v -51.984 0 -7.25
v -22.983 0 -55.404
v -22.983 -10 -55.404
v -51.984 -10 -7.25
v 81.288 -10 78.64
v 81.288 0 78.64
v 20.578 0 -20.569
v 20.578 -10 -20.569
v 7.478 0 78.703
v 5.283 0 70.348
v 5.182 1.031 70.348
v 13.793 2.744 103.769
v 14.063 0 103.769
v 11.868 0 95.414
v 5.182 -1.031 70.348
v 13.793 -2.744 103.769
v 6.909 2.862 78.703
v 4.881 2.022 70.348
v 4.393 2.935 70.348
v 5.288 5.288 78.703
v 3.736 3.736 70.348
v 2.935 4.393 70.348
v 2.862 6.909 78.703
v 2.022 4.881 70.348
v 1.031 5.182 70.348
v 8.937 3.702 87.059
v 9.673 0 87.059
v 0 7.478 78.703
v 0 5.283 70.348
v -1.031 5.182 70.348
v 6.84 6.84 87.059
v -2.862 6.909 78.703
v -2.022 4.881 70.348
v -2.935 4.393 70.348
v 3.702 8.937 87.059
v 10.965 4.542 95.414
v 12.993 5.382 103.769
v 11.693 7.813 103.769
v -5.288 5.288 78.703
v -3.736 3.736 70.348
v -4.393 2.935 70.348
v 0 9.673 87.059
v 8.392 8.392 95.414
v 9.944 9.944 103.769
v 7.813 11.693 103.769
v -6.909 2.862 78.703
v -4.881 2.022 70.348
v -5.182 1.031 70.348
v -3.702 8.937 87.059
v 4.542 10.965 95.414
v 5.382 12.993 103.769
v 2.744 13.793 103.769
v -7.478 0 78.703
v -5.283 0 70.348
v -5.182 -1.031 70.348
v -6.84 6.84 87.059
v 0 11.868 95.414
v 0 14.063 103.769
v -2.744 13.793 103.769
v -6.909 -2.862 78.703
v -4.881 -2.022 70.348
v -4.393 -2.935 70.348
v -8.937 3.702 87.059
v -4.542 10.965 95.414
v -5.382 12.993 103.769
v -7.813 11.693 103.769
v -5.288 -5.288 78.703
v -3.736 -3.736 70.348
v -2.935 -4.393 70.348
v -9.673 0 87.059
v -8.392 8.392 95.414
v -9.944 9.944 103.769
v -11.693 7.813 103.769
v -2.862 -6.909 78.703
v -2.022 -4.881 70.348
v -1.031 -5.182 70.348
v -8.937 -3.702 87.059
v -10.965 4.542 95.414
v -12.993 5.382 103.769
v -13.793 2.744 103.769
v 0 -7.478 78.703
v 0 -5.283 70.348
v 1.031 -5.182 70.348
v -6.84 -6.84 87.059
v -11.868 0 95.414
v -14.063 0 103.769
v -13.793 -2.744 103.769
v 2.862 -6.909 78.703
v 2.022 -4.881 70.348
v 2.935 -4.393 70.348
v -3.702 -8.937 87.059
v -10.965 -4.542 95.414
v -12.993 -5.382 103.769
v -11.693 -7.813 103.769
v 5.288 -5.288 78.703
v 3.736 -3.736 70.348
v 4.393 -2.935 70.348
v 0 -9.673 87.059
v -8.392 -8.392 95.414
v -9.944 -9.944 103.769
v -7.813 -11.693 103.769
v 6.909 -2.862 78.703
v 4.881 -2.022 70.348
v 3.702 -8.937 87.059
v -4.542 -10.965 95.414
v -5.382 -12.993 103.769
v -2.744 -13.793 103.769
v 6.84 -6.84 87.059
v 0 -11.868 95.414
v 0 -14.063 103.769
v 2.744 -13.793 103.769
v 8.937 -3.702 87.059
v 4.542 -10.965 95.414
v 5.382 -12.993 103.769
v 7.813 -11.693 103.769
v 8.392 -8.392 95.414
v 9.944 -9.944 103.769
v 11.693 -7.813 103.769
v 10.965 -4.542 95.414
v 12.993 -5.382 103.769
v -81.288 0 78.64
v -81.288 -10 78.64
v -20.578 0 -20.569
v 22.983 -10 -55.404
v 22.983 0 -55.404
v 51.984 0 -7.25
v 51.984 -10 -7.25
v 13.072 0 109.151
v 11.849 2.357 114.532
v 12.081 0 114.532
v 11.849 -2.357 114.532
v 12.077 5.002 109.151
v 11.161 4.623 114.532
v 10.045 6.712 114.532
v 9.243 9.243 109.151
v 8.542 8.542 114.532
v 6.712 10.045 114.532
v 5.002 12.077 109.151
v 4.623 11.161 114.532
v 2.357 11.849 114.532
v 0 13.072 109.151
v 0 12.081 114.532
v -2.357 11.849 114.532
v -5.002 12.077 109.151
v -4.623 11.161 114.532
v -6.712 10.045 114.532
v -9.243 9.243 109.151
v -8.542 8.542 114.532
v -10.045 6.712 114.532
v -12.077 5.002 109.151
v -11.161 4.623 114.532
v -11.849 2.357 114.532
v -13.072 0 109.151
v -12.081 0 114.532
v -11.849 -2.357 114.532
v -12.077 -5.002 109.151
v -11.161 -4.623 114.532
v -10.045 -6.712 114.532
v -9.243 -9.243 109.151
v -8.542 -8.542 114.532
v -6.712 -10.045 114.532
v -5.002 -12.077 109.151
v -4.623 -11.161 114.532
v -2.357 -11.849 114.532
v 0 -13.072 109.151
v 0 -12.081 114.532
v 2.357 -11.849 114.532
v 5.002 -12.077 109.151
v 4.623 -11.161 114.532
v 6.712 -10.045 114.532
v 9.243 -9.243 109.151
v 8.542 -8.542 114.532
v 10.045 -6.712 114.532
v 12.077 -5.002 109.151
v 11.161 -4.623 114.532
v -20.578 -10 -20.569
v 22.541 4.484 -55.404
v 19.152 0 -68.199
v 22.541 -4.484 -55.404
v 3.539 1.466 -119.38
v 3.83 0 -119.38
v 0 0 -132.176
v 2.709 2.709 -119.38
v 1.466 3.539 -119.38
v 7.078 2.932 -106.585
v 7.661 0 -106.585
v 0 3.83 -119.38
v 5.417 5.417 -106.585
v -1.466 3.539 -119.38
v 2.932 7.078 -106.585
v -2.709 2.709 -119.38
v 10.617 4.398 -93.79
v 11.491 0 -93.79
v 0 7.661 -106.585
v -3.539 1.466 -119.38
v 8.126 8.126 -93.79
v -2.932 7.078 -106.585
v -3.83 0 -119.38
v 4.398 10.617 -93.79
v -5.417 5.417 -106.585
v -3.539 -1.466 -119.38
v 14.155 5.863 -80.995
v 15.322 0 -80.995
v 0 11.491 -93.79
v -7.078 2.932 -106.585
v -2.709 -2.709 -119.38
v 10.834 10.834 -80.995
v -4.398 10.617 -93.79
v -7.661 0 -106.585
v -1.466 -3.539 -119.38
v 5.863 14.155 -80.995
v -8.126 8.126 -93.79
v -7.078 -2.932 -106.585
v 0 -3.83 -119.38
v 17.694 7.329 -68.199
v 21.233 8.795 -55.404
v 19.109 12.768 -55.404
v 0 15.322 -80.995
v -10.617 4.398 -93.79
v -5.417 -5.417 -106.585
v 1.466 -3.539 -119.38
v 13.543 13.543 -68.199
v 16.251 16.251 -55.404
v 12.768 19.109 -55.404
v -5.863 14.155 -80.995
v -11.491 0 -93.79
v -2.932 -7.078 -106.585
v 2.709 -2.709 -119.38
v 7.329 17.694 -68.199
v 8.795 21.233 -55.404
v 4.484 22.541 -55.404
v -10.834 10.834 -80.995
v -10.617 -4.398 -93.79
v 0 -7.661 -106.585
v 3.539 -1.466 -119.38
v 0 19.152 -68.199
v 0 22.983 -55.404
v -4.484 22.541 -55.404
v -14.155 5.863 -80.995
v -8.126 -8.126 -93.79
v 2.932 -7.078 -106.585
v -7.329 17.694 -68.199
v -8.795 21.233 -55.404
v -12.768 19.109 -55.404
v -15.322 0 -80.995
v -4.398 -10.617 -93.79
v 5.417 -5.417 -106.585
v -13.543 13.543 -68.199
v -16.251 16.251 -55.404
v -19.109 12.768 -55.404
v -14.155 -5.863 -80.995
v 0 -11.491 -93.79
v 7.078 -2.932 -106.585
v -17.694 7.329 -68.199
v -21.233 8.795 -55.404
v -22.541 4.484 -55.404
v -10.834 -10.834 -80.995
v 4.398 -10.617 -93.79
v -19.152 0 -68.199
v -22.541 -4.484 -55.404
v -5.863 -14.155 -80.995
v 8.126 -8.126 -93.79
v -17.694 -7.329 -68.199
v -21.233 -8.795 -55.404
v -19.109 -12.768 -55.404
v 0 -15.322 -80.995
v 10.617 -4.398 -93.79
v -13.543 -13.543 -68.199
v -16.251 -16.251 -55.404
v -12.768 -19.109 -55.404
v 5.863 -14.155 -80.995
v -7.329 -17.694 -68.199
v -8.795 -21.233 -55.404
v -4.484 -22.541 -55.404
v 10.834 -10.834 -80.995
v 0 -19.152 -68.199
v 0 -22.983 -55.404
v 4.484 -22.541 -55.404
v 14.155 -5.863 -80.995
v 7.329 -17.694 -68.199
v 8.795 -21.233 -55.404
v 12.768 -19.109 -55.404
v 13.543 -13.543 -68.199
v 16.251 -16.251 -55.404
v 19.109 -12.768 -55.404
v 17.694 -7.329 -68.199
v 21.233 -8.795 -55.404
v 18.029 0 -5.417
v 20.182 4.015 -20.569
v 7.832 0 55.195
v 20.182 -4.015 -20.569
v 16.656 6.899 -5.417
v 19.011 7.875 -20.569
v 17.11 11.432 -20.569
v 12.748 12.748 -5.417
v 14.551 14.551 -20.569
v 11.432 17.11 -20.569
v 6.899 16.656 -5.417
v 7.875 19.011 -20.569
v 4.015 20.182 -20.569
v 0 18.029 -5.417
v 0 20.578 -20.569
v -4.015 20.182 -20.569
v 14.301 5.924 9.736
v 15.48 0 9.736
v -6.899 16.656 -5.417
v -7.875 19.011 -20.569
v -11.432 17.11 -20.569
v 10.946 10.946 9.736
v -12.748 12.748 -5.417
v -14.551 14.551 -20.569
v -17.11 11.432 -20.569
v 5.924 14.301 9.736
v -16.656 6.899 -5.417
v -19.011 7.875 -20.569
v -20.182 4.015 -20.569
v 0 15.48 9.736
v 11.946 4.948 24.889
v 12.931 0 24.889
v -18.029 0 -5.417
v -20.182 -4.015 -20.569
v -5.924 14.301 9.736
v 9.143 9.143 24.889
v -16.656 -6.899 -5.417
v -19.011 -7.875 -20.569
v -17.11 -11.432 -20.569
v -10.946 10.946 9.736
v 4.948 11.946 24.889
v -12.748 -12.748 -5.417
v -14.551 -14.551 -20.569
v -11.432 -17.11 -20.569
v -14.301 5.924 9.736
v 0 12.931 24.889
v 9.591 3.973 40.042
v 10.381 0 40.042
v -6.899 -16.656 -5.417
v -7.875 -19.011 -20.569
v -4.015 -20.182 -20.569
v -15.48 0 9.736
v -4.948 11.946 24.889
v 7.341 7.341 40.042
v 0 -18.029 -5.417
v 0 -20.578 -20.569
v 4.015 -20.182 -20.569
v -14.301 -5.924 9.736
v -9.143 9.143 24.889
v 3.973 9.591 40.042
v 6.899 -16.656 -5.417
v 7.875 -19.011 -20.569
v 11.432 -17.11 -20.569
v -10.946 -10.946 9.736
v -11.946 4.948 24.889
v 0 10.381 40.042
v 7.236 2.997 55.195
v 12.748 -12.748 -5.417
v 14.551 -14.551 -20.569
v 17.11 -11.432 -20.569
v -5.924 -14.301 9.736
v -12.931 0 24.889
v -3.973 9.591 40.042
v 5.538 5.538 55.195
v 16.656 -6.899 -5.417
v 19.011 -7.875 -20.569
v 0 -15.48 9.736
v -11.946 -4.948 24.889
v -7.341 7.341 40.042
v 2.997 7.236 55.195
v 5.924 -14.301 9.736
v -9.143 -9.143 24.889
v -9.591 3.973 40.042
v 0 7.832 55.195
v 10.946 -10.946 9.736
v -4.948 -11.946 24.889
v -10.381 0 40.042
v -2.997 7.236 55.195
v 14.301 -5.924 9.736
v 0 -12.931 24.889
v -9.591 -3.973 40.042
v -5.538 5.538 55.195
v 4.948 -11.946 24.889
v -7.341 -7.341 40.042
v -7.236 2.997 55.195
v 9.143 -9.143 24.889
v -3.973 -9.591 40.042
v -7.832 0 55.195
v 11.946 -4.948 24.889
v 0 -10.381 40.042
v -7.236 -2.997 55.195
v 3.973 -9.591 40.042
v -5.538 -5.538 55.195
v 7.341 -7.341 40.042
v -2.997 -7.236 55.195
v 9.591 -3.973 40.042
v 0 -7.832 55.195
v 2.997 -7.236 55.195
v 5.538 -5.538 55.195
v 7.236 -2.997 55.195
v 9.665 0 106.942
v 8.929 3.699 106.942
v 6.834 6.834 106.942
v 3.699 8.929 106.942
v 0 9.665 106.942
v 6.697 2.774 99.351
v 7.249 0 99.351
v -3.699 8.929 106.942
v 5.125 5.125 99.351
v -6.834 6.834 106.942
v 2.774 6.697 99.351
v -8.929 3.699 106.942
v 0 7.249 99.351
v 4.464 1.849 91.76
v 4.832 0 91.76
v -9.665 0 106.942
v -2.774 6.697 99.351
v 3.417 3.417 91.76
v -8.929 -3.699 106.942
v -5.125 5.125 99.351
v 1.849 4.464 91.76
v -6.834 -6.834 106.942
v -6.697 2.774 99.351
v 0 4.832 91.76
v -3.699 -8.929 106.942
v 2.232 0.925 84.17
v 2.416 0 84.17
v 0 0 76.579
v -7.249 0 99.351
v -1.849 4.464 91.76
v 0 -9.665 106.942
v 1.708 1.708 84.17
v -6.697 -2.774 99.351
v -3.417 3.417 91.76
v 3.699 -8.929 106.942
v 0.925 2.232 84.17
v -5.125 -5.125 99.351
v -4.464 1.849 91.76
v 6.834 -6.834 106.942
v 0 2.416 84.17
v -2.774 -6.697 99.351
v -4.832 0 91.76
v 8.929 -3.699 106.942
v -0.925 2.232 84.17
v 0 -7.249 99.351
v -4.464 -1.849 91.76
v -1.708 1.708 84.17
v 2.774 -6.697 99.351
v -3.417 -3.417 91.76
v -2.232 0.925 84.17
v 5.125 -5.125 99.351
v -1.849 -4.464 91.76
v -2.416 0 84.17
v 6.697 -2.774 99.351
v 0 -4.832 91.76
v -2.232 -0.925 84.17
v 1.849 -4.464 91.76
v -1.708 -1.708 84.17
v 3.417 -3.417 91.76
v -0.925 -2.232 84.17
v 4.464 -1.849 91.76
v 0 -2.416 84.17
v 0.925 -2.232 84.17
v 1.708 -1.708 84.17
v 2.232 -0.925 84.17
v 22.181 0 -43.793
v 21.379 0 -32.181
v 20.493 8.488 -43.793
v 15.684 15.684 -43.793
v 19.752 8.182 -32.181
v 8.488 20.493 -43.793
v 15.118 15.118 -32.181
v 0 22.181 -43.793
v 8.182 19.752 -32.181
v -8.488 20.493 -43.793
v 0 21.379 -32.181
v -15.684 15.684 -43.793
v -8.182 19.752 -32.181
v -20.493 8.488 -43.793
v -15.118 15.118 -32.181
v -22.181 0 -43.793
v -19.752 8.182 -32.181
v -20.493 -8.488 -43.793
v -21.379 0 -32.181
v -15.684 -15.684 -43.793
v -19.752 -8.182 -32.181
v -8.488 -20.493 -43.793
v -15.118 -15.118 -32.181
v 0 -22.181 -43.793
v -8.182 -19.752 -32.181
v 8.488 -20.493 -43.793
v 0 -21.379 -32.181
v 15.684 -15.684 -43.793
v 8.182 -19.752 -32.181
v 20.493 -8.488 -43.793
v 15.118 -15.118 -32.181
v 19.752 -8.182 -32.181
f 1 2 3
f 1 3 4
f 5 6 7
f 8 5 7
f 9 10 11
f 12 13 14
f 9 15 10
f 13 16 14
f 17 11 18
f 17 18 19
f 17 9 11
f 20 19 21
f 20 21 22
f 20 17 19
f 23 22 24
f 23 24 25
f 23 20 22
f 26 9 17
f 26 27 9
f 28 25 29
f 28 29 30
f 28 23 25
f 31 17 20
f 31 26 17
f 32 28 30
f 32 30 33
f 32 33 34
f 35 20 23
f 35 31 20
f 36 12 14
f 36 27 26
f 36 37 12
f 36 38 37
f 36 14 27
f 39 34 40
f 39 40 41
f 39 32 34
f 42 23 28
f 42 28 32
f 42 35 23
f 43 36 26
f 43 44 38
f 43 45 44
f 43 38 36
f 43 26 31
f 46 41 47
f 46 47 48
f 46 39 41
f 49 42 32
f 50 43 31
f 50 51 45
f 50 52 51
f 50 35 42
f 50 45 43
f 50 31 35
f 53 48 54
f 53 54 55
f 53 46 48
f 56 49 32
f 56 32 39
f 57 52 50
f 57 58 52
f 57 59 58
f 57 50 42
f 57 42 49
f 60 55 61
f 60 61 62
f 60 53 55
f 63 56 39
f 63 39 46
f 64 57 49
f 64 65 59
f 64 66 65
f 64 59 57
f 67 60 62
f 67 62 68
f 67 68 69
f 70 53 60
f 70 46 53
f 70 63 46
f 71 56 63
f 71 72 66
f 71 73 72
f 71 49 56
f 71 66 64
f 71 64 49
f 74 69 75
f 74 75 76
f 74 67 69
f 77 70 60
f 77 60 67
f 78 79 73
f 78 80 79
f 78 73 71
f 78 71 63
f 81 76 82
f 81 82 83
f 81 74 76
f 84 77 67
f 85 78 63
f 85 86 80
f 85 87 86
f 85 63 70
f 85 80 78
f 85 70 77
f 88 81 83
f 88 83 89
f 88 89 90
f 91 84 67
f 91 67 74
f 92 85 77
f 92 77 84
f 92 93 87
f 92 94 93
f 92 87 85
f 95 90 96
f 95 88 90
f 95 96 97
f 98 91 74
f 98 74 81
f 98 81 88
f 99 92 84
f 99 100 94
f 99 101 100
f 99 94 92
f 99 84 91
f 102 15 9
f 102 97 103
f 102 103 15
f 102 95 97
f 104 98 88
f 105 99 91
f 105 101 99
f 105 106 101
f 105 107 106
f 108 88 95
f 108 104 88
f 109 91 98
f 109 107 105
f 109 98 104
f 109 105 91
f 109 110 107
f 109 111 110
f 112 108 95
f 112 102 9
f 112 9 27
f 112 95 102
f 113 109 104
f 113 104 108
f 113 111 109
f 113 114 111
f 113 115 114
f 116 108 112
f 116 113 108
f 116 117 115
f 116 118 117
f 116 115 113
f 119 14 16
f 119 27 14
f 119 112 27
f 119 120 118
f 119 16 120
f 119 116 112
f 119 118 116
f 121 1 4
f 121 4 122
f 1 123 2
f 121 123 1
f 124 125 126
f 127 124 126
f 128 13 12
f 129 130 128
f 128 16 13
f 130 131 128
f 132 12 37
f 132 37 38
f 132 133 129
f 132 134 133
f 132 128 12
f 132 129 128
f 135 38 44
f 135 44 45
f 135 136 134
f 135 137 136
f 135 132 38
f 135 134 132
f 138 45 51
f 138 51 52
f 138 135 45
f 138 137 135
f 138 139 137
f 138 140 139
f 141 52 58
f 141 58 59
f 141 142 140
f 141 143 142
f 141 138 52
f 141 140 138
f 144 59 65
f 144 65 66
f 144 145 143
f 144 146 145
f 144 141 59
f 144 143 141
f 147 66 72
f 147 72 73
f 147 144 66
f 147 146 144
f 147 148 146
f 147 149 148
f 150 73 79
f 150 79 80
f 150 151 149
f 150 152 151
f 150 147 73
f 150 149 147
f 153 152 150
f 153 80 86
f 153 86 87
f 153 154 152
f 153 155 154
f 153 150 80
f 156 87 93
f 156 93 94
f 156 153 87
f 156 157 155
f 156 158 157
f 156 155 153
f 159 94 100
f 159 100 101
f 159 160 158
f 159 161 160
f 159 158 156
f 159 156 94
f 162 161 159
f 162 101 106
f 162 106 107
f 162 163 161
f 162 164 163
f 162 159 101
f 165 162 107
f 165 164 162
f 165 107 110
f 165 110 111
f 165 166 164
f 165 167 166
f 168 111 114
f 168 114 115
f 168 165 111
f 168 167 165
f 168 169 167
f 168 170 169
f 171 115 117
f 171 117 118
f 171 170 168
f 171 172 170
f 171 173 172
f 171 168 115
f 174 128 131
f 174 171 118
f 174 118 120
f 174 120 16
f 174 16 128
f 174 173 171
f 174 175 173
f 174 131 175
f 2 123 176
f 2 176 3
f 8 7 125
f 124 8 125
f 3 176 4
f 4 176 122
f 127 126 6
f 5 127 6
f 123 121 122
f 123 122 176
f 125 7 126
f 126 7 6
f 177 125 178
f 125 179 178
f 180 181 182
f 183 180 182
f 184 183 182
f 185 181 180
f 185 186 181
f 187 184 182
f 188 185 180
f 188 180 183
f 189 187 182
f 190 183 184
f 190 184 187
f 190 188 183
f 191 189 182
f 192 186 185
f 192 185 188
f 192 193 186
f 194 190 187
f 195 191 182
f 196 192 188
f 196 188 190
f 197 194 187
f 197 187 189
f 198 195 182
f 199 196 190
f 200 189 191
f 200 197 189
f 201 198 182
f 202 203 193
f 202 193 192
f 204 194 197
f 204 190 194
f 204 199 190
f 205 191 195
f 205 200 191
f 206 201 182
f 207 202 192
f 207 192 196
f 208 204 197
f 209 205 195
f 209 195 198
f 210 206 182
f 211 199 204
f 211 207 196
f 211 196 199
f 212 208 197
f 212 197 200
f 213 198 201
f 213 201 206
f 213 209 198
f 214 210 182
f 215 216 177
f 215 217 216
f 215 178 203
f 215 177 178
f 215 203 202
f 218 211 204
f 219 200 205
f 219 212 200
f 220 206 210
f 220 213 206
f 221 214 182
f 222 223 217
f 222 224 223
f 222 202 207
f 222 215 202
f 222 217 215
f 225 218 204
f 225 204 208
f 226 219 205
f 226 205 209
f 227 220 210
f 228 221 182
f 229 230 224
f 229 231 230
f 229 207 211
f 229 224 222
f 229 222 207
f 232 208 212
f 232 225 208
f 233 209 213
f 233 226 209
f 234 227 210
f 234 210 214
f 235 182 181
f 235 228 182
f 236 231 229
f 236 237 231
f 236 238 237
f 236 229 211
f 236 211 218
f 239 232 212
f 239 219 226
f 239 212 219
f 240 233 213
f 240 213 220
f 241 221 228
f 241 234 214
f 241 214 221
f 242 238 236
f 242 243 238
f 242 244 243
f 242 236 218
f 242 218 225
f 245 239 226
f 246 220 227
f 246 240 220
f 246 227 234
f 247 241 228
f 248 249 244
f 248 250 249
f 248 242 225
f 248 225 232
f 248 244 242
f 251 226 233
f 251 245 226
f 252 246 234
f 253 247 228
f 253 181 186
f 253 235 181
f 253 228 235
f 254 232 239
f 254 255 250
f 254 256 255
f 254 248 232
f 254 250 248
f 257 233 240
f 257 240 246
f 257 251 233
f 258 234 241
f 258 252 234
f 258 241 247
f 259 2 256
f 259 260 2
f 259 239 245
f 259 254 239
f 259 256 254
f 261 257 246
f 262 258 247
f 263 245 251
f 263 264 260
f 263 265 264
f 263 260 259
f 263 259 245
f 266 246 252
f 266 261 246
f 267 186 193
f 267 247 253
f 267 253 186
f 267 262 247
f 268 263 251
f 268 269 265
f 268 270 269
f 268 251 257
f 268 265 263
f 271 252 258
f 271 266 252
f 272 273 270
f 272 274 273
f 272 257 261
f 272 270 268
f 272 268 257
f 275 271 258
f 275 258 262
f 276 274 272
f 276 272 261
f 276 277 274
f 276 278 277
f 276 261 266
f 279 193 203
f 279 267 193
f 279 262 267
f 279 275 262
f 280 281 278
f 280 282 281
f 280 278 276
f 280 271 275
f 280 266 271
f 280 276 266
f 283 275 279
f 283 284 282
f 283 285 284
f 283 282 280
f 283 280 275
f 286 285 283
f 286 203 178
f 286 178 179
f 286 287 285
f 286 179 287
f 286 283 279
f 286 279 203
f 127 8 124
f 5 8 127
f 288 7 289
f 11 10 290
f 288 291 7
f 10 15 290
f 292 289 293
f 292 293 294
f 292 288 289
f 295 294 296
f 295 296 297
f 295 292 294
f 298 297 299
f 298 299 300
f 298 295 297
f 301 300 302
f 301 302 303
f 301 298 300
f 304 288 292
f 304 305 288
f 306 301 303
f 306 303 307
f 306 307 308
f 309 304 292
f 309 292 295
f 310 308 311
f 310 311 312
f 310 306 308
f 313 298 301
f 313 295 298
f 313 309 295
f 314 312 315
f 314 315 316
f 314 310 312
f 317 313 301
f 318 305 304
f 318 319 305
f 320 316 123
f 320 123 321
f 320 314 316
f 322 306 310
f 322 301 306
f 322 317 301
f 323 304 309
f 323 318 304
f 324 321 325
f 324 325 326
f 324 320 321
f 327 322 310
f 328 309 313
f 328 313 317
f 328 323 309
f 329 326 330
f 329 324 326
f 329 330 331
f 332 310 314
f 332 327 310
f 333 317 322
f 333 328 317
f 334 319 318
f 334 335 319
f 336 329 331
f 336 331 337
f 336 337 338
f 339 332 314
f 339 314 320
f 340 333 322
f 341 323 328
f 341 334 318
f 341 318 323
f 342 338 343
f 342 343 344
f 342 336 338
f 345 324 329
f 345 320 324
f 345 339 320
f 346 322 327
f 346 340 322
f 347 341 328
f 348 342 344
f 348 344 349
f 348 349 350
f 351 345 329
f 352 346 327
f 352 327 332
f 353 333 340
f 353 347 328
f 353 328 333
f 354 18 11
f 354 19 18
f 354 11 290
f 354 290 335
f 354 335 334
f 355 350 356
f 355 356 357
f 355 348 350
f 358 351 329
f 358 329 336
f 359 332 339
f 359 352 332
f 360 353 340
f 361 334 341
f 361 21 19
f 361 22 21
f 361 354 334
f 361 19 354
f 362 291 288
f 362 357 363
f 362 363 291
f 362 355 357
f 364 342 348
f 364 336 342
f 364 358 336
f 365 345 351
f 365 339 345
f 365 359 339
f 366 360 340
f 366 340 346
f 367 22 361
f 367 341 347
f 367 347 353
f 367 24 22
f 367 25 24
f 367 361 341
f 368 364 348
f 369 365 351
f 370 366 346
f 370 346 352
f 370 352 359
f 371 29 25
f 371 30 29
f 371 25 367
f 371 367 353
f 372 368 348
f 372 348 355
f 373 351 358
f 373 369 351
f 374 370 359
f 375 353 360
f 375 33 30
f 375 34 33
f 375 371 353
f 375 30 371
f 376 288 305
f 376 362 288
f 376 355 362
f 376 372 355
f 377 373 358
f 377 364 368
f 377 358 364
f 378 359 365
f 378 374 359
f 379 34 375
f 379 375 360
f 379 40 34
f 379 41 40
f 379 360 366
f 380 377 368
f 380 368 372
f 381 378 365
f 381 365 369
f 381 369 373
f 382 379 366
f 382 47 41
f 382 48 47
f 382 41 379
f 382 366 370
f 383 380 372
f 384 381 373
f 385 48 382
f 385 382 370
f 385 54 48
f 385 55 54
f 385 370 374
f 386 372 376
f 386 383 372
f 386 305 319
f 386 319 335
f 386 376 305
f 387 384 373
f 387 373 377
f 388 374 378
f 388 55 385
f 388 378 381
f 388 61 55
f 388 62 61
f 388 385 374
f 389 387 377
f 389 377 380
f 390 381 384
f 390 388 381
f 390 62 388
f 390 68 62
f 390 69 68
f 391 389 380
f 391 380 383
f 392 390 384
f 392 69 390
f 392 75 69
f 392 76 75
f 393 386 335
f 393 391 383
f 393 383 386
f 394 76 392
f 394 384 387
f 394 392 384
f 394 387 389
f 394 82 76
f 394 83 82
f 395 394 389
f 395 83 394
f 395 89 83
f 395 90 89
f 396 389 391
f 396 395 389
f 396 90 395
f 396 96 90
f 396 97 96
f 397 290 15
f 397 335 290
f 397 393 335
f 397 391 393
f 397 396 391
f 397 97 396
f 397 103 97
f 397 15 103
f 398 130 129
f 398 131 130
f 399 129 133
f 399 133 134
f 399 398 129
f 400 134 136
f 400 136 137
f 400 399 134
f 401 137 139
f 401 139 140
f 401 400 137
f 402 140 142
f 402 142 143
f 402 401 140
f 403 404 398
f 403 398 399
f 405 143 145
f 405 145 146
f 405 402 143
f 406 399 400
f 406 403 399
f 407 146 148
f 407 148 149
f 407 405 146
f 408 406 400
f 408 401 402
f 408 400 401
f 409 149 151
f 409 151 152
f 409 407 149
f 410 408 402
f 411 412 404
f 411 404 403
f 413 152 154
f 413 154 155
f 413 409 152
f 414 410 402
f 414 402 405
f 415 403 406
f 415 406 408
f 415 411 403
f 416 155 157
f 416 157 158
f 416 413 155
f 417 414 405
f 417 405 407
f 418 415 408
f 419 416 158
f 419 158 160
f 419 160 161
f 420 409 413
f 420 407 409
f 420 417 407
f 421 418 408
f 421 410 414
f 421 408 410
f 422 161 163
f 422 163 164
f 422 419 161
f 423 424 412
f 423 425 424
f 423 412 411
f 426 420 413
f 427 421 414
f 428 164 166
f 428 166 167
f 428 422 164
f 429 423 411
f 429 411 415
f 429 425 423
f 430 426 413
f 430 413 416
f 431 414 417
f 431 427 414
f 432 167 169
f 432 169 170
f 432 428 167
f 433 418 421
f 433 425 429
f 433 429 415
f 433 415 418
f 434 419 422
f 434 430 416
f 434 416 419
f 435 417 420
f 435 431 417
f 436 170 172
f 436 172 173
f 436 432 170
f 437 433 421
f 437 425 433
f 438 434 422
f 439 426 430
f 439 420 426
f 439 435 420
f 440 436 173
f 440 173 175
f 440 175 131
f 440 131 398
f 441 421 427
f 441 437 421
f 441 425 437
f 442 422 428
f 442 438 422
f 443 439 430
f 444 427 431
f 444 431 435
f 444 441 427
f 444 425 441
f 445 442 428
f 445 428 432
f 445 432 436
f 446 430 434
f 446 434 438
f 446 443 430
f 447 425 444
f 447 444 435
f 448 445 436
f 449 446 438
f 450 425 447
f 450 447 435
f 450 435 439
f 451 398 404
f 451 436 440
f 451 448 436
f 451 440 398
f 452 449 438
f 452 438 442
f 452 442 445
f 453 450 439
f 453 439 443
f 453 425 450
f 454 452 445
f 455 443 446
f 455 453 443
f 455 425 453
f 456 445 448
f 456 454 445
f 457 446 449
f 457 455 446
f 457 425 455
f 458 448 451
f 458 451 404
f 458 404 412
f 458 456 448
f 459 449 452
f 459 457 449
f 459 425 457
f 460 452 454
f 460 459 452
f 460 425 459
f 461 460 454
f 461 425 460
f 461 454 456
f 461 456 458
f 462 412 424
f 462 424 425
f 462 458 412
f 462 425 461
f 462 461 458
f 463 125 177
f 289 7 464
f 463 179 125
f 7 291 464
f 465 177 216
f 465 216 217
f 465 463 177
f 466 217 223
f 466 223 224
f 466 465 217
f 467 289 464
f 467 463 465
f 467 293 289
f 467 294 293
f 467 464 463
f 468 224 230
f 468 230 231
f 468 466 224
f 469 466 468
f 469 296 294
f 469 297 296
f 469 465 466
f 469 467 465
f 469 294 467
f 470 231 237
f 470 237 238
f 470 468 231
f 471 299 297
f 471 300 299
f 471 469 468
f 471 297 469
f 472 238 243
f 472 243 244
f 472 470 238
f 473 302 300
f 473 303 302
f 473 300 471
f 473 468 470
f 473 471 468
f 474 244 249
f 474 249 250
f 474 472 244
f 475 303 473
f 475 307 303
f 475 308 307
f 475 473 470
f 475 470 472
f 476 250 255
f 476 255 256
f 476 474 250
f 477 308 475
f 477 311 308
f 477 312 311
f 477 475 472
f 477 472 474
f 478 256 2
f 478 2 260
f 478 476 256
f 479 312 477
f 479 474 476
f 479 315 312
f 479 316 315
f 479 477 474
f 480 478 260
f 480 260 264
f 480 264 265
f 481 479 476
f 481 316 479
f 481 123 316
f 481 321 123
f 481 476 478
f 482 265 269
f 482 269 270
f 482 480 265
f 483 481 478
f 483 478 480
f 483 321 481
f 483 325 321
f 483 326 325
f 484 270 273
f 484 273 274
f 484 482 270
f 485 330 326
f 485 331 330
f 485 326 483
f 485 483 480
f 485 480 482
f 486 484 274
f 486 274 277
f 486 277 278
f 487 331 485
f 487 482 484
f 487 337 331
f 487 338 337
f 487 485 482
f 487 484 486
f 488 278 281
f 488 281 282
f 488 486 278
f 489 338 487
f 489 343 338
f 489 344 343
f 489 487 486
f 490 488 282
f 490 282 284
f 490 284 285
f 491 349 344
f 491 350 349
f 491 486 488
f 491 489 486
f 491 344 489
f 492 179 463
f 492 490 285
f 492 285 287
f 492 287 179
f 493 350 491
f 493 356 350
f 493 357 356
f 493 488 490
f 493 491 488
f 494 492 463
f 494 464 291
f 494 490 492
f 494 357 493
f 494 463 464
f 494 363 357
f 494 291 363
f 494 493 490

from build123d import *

# Parameters (mm, degrees)
F1_DEPTH = 10


with BuildPart() as f1:
    # F0 (on Front) → F1 (new body)
    with BuildSketch(Plane.XZ):
        Polygon((20.577798, -20.569425), (22.982594, -55.404078), (51.984232, -7.249753), (81.287712, 78.639761), align=None)
    extrude(amount=F1_DEPTH)


with BuildPart() as f2_1:
    # F2: instance of F1
    add(f1.part.mirror(Plane.YZ))


with BuildPart() as f3:
    # F0 (on Front) → F3 (revolve)
    with BuildSketch(Plane.XZ):
        Polygon((12.080834, 114.532284), (0, 76.579183), (0, 0), (0, -132.175684), (22.982594, -55.404078), (20.577798, -20.569425), (5.283264, 70.348077), (14.063459, 103.769466), align=None)
    revolve(axis=Axis((0, 0, -66.087842), (0, 0, 1)))


solid = Compound([f1.part, f2_1.part, f3.part])
